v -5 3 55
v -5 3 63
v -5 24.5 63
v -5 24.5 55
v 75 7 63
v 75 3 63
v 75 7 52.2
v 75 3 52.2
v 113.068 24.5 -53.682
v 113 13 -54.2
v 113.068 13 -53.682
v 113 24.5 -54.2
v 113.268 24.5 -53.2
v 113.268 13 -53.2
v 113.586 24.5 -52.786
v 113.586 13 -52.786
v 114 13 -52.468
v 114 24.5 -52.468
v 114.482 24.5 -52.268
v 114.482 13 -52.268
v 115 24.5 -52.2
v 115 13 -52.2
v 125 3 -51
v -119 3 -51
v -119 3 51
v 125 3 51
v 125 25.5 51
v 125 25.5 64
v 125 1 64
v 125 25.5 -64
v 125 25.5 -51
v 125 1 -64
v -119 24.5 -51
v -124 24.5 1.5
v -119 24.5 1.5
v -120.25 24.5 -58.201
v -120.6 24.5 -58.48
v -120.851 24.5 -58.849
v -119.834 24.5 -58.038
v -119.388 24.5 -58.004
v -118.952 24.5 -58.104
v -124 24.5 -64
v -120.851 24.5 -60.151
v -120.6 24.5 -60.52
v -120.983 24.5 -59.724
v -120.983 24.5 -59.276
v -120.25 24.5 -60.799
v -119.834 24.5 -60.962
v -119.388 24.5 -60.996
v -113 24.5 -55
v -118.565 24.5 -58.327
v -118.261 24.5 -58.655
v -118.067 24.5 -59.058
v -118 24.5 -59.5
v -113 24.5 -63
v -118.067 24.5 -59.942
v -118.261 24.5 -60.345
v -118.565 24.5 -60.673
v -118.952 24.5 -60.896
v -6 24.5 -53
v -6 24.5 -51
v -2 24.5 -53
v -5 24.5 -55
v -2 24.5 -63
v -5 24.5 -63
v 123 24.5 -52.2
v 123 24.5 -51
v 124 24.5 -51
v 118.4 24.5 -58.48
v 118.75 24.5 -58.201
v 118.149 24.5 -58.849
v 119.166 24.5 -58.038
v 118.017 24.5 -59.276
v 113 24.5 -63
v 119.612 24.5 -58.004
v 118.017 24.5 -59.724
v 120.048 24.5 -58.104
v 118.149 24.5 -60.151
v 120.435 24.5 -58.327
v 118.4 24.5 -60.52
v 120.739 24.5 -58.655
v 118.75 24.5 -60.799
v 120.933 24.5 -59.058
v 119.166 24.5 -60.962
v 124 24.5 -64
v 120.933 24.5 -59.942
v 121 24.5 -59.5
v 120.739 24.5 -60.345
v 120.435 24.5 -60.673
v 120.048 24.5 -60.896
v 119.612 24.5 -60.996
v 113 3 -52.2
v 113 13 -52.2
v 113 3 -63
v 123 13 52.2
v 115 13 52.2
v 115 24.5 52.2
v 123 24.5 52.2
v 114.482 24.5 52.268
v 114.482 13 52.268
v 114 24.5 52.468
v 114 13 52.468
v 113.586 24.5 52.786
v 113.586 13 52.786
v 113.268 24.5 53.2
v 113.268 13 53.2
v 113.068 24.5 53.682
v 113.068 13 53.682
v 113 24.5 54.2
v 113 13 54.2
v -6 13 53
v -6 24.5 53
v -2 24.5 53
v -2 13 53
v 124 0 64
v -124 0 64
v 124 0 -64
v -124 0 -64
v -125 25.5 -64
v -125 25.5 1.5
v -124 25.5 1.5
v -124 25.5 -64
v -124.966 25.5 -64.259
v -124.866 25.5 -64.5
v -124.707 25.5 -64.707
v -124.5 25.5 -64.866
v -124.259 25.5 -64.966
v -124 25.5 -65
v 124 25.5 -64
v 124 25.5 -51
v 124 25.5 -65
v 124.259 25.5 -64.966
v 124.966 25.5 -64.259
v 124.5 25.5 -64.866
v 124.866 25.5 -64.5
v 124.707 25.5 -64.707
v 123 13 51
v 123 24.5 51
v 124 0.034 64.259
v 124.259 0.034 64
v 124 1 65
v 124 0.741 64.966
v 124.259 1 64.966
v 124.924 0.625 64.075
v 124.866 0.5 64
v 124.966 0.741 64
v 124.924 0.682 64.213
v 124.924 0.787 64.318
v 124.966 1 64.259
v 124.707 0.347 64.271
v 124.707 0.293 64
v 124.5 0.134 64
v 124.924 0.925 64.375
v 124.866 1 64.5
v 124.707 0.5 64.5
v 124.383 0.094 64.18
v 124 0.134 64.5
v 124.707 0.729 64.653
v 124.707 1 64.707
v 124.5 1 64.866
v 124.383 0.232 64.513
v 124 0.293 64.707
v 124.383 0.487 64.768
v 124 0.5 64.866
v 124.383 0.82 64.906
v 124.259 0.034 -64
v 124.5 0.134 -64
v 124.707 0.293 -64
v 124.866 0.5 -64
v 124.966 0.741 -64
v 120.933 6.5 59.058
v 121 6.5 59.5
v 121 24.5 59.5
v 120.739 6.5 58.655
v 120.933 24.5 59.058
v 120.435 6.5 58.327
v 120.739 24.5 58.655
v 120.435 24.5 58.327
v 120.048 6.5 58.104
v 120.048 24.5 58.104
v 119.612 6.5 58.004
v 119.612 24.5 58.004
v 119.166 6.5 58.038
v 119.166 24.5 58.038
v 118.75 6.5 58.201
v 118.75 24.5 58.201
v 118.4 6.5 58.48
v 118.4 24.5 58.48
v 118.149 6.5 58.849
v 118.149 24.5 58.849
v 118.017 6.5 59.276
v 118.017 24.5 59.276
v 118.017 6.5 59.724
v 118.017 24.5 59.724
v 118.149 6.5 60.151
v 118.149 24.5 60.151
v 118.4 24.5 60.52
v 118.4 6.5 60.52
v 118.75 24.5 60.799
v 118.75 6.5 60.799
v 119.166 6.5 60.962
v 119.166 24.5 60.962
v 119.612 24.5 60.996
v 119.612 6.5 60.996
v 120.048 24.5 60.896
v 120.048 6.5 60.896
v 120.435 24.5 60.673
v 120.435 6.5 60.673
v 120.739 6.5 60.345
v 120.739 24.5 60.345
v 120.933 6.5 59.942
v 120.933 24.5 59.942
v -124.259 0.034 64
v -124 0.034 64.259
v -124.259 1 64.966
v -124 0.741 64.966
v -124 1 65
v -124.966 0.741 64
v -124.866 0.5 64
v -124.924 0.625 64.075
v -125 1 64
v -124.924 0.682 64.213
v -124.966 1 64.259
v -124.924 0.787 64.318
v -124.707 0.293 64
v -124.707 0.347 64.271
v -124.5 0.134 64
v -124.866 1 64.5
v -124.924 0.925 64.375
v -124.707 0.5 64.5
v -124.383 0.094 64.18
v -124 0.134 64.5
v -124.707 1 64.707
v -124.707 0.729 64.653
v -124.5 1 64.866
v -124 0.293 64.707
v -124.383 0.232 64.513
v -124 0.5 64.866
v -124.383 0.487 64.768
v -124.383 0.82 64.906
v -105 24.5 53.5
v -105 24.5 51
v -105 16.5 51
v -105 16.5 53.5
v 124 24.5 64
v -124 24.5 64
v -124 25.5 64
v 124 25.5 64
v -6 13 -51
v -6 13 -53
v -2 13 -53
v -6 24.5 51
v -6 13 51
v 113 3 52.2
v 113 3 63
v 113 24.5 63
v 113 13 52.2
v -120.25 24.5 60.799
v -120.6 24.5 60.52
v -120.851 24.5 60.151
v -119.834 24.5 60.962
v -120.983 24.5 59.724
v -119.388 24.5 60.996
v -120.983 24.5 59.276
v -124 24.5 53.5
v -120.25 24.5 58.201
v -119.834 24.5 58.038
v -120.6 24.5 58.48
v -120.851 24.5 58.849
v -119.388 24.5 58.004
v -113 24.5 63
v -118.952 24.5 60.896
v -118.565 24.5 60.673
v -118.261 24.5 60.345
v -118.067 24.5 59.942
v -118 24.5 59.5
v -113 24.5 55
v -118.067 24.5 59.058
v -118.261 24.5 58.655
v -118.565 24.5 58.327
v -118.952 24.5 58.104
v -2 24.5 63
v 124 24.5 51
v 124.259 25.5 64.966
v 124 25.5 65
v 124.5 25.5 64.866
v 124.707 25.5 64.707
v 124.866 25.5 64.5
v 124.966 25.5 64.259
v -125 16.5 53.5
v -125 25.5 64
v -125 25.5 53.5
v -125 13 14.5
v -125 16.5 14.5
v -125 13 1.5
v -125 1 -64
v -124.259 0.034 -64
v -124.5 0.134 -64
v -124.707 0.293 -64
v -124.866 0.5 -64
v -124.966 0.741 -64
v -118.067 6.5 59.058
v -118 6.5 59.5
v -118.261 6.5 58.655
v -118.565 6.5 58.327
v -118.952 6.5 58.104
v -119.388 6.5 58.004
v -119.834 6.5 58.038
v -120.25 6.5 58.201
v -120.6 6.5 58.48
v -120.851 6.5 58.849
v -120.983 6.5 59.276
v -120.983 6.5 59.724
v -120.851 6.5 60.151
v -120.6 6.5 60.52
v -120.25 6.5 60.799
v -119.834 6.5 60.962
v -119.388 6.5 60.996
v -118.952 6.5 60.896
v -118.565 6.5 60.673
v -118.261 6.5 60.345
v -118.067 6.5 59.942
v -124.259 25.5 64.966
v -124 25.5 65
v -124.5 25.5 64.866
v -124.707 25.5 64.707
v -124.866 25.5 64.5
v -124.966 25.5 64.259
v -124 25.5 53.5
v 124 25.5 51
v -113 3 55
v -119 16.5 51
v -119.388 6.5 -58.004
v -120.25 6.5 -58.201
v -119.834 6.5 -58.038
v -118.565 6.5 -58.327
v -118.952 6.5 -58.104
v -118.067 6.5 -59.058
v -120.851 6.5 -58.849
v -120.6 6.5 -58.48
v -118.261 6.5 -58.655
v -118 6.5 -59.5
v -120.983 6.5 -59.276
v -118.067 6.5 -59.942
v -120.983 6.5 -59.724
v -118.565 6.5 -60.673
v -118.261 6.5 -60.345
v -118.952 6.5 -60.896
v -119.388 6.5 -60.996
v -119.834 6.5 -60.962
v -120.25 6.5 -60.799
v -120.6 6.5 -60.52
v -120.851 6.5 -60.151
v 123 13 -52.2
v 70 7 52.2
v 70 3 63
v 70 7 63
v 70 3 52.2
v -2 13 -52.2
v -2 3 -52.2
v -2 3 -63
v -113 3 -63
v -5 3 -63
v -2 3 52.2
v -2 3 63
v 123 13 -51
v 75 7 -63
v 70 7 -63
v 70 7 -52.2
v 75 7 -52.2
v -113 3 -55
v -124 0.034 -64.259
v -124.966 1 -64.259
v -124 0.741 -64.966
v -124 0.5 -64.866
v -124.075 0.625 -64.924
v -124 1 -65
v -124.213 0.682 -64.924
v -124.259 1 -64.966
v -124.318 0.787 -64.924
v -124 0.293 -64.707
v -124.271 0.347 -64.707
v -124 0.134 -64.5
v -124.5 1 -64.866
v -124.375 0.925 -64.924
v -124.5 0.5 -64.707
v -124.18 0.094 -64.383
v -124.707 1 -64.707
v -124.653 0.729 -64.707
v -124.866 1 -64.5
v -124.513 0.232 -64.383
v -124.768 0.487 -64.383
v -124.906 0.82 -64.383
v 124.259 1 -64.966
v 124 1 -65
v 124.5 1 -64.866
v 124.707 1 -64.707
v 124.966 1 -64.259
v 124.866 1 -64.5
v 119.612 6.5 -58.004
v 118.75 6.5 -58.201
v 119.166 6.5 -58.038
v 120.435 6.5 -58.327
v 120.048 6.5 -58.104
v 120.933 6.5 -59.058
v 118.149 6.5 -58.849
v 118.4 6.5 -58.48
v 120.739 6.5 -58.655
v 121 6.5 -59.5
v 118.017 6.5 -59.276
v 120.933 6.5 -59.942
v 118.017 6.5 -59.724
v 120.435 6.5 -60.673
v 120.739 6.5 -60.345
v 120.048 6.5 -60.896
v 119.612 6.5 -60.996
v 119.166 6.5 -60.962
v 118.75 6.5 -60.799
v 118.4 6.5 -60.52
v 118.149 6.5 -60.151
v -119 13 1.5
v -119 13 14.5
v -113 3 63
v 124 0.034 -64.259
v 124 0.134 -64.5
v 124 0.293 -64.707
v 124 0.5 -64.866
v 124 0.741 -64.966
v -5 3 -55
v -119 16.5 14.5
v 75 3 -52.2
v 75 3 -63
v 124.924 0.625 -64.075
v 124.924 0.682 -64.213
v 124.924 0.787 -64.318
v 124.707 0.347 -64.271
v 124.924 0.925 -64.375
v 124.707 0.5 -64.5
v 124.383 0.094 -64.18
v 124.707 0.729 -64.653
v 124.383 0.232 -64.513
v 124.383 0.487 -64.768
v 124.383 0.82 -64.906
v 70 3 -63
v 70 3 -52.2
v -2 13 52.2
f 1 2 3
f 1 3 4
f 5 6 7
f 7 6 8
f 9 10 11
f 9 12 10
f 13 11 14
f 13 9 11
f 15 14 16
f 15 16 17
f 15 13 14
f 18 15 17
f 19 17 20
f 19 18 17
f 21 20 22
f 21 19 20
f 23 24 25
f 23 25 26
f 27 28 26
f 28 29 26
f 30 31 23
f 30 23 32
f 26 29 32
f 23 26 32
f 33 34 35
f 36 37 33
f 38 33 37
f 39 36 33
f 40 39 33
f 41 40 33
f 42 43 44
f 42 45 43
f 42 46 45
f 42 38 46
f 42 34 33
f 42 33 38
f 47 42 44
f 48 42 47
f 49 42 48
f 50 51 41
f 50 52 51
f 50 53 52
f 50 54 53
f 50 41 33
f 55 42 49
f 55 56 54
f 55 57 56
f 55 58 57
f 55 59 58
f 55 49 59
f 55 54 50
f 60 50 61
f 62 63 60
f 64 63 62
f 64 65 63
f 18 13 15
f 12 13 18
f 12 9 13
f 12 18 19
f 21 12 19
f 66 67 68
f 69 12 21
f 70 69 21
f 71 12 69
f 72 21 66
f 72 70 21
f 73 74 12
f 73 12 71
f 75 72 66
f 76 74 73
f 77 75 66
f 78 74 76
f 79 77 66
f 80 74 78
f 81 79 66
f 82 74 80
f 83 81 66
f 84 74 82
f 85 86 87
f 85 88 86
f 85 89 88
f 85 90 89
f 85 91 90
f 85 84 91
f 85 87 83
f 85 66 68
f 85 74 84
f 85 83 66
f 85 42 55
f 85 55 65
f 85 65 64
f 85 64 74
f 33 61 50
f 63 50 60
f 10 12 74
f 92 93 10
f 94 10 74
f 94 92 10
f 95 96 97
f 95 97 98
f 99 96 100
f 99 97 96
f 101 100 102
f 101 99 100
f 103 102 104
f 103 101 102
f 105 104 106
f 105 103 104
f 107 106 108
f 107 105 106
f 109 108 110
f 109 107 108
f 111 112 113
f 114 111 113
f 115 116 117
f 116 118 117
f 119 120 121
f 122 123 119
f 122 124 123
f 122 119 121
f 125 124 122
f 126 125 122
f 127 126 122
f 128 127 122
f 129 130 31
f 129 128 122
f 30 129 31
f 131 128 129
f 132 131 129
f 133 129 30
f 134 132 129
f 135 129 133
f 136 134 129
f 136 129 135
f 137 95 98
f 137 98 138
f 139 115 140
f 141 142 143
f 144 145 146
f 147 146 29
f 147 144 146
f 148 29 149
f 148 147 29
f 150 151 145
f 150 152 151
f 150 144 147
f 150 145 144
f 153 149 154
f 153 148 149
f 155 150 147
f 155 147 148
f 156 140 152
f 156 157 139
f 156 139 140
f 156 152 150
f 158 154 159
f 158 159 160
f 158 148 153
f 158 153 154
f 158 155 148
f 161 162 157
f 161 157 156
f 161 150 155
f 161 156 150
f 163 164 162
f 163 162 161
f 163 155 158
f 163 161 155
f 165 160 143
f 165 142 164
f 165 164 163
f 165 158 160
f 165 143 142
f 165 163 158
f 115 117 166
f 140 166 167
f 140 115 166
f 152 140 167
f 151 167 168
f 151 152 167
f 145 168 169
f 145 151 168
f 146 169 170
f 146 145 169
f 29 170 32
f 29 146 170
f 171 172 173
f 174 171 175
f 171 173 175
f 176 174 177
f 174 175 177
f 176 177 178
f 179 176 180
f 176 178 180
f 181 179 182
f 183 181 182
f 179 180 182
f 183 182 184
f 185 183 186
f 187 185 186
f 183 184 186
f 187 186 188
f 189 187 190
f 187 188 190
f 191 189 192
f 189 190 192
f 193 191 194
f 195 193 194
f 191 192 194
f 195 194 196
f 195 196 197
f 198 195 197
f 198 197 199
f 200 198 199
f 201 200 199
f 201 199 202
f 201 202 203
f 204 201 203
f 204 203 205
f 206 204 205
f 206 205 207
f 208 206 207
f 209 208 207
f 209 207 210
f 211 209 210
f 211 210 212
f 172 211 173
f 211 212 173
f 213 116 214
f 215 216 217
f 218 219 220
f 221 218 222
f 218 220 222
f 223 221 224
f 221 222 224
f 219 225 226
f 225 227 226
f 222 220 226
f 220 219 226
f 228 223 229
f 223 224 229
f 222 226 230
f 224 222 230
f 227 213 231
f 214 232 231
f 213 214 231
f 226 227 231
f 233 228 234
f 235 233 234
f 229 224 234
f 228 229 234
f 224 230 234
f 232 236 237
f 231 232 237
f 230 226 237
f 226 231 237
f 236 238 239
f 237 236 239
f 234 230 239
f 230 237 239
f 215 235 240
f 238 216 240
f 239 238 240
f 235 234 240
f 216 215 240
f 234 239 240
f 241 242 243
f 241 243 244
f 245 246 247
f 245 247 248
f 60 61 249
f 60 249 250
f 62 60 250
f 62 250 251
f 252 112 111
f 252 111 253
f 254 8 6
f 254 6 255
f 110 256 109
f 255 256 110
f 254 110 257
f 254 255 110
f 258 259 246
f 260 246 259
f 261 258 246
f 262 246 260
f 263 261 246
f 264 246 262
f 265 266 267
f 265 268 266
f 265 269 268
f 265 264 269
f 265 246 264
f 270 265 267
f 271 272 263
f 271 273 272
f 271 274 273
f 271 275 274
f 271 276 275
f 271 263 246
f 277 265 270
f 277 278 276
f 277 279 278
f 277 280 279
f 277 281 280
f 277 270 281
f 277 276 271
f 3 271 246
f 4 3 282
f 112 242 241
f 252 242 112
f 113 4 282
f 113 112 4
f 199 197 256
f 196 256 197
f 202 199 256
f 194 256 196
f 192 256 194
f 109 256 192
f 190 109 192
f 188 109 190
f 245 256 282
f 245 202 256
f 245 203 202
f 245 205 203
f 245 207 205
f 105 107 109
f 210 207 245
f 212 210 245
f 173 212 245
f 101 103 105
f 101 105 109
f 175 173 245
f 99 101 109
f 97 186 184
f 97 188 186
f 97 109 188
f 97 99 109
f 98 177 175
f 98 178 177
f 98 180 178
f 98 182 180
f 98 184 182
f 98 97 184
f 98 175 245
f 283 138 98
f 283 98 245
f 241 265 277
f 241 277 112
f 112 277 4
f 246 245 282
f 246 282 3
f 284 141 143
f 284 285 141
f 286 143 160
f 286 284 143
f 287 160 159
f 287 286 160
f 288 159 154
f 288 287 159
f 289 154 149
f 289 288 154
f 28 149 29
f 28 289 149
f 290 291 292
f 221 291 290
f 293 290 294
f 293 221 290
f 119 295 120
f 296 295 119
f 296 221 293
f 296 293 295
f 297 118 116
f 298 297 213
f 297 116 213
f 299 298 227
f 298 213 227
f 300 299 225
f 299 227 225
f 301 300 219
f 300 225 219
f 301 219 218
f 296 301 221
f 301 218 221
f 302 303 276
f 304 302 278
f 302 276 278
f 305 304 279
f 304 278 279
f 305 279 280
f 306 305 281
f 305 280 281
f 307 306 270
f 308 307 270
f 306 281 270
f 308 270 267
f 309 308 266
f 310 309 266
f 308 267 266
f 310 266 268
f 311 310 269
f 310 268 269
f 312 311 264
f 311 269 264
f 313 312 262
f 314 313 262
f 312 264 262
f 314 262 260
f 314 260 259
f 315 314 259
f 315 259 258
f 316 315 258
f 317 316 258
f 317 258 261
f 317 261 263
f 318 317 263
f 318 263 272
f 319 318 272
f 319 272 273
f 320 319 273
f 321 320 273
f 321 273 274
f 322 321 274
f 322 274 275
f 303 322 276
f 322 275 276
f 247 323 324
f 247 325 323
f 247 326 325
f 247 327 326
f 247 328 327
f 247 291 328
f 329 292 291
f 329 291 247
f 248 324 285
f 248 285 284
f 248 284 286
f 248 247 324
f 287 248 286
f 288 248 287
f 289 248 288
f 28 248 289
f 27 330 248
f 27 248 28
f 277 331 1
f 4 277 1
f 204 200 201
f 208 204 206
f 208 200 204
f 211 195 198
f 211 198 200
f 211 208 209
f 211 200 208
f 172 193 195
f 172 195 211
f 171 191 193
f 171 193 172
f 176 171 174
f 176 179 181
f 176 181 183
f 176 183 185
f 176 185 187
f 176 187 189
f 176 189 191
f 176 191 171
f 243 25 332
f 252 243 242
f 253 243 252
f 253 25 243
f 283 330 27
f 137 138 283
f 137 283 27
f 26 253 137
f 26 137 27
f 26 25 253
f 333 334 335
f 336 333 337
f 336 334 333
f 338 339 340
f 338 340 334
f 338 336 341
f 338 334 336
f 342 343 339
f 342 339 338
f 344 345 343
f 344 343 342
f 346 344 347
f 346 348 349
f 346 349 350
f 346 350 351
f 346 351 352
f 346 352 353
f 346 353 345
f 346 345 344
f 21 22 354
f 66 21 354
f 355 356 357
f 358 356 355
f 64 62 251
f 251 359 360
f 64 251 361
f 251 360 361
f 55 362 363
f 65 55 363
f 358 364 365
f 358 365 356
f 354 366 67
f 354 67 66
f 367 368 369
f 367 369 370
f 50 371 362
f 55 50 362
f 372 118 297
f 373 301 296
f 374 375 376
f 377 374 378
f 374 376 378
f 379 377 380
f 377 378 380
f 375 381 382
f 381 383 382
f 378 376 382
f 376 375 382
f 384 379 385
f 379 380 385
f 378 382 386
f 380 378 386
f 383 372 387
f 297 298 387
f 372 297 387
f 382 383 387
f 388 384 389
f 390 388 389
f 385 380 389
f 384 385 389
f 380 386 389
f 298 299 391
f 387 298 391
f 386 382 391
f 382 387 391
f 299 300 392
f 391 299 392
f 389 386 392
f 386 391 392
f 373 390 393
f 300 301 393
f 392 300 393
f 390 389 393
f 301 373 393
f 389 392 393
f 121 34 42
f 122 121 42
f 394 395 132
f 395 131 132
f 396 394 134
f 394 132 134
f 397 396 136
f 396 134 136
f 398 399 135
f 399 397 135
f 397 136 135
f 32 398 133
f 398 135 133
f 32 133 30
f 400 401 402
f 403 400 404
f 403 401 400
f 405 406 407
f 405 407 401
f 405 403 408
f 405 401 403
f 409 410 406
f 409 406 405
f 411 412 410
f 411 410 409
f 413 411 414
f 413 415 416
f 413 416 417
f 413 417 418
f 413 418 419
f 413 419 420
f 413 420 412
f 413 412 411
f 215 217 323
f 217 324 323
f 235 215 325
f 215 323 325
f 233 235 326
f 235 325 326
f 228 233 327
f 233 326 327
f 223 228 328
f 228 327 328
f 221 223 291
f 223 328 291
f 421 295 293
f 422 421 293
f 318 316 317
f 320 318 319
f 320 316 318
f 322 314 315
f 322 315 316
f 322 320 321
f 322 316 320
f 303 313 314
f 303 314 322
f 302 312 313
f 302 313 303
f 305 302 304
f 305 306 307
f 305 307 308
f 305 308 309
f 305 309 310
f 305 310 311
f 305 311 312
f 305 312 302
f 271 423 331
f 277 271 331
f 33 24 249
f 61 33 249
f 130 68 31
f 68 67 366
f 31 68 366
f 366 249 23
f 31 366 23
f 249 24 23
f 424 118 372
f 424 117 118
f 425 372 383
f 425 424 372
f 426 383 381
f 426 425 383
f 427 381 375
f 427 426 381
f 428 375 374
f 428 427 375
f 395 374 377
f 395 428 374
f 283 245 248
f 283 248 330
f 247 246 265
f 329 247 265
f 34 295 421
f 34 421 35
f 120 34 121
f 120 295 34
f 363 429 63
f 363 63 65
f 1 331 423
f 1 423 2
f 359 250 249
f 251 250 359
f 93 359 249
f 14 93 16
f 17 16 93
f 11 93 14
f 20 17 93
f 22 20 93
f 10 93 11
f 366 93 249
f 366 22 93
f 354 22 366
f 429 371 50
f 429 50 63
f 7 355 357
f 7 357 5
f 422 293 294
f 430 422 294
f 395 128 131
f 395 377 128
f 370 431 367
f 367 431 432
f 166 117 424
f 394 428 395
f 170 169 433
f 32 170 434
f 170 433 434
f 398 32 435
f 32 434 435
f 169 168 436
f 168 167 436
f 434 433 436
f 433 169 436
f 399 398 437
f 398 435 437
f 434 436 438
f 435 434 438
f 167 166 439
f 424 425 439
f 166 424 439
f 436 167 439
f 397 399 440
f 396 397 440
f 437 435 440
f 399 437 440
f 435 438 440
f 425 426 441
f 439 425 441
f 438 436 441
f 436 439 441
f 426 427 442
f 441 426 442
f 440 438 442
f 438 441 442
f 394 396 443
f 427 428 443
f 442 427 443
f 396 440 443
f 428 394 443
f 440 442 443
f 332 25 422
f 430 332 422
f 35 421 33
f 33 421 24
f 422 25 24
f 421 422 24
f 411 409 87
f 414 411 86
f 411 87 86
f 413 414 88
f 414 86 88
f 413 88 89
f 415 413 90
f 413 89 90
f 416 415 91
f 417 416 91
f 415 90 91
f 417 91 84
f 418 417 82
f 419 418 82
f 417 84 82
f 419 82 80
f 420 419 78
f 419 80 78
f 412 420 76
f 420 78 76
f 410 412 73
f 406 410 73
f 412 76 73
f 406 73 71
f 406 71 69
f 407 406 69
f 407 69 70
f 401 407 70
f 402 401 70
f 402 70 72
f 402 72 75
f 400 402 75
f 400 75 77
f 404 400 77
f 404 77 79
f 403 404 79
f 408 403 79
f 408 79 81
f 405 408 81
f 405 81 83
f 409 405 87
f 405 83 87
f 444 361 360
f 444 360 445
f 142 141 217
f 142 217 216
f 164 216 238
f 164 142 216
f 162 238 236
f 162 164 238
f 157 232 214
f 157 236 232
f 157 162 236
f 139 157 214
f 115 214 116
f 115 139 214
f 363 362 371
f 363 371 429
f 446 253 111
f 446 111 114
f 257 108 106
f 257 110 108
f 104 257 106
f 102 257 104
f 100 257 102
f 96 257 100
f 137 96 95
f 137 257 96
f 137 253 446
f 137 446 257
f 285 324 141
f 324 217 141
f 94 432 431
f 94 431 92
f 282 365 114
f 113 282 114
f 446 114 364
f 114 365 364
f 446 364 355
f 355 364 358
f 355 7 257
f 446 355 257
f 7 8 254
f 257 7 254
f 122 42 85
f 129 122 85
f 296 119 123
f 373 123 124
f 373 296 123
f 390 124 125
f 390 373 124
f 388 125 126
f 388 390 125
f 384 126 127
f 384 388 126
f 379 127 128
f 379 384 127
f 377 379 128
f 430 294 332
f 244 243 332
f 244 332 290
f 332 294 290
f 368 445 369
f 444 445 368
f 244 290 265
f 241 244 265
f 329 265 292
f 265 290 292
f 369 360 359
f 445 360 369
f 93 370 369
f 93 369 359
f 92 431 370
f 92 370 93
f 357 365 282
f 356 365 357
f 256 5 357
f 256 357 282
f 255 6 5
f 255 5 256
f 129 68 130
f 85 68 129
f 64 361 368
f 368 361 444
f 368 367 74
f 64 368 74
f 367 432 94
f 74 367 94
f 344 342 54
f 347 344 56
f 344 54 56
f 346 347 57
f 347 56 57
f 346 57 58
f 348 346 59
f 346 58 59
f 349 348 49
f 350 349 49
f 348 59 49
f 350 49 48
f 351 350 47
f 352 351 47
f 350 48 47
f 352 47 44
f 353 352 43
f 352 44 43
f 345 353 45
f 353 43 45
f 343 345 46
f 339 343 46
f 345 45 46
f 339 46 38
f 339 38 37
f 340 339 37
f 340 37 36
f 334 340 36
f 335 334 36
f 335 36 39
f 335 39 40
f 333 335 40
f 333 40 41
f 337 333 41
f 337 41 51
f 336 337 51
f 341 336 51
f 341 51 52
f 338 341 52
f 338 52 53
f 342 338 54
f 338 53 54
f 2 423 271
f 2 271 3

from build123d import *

# Parameters (mm, degrees)
SKETCH1_W             = 250
SKETCH1_H             = 130
BOSS_EXTRUDE1_DEPTH   = 3
SKETCH2_W             = 250
SKETCH2_H             = 1
BOSS_EXTRUDE2_DEPTH   = 25.5
SKETCH3_W             = 250
SKETCH3_H             = 1
BOSS_EXTRUDE3_DEPTH   = 22.5
SKETCH4_W             = 1
SKETCH4_H             = 128
BOSS_EXTRUDE4_DEPTH   = 22.5
SKETCH6_W             = 1
SKETCH6_H             = 14
BOSS_EXTRUDE5_DEPTH   = 22.5
SKETCH7_W             = 1
SKETCH7_H             = 14
BOSS_EXTRUDE6_DEPTH   = 22.5
SKETCH8_W             = 1
SKETCH8_H             = 13
BOSS_EXTRUDE7_DEPTH   = 21.5
SKETCH10_W            = 247
SKETCH10_H            = 1
BOSS_EXTRUDE8_DEPTH   = 21.5
SKETCH11_W            = 1
SKETCH11_H            = 127
BOSS_EXTRUDE9_DEPTH   = 21.5
SKETCH14_W            = 247
SKETCH14_H            = 1
BOSS_EXTRUDE10_DEPTH  = 21.5
SKETCH15_W            = 1
SKETCH15_H            = 12
BOSS_EXTRUDE11_DEPTH  = 21.5
FILLET1_R             = 1
SKETCH17_W            = 128
SKETCH17_H            = 1.2
BOSS_EXTRUDE12_DEPTH  = 10
SKETCH19_W            = 128
SKETCH19_H            = 1.2
BOSS_EXTRUDE13_DEPTH  = 10
SKETCH22_W            = 3
SKETCH22_H            = 10.8
BOSS_EXTRUDE14_DEPTH  = 21.5
SKETCH24_W            = 3
SKETCH24_H            = 10.8
BOSS_EXTRUDE15_DEPTH  = 21.5
SKETCH31_W            = 5
SKETCH31_H            = 10.8
BOSS_EXTRUDE16_DEPTH  = 4
SKETCH33_W            = 5
SKETCH33_H            = 10.8
BOSS_EXTRUDE18_DEPTH  = 4
SKETCH44_W            = 118
SKETCH44_H            = 4
BOSS_EXTRUDE28_DEPTH  = 21.5
SKETCH45_W            = 10
SKETCH45_H            = 12
BOSS_EXTRUDE29_DEPTH  = 21.5
SKETCH46_W            = 10
SKETCH46_H            = 8
BOSS_EXTRUDE30_DEPTH  = 21.5
SKETCH47_W            = 10
SKETCH47_H            = 10.8
BOSS_EXTRUDE31_DEPTH  = 21.5
SKETCH48_W            = 10
SKETCH48_H            = 10.8
BOSS_EXTRUDE32_DEPTH  = 21.5
SKETCH49_W            = 108
SKETCH49_H            = 4
BOSS_EXTRUDE33_DEPTH  = 21.5
SKETCH62_R            = 1.5
CASEMUNTHOLE001_DEPTH = 18
SKETCH63_R            = 1.5
CASEMUNTHOLE002_DEPTH = 18
SKETCH64_R            = 1.5
CASEMUNTHOLE003_DEPTH = 18
SKETCH65_R            = 1.5
CASEMUNTHOLE004_DEPTH = 18
SKETCH67_W            = 4
SKETCH67_H            = 102
BOSS_EXTRUDE35_DEPTH  = 21.5
SKETCH72_W            = 39
SKETCH72_H            = 9
CUT_EXTRUDE1_DEPTH    = 20
SKETCH73_W            = 13
SKETCH73_H            = 12.5
CUT_EXTRUDE2_DEPTH    = 20
SKETCH74_W            = 4
SKETCH74_H            = 2
CUT_EXTRUDE3_DEPTH    = 11.5
SKETCH75_W            = 4
SKETCH75_H            = 2
CUT_EXTRUDE4_DEPTH    = 11.5
FILLET2_R             = 2


with BuildPart() as part:
    # Sketch1 → Boss-Extrude1 (new body)
    with BuildSketch(Plane(origin=(0, 0, 0), x_dir=(1, 0, 0), z_dir=(0, 1, 0))):
        Rectangle(SKETCH1_W, SKETCH1_H)
    extrude(amount=BOSS_EXTRUDE1_DEPTH)

    # Sketch2 → Boss-Extrude2 (add)
    with BuildSketch(Plane(origin=(0, 0, 0), x_dir=(1, 0, 0), z_dir=(0, 1, 0))):
        with Locations((0, 64.5)):
            Rectangle(SKETCH2_W, SKETCH2_H)
    extrude(amount=BOSS_EXTRUDE2_DEPTH)

    # Sketch3 → Boss-Extrude3 (add)
    with BuildSketch(Plane(origin=(0, 3, 0), x_dir=(1, 0, 0), z_dir=(0, 1, 0))):
        with Locations((0, -64.5)):
            Rectangle(SKETCH3_W, SKETCH3_H)
    extrude(amount=BOSS_EXTRUDE3_DEPTH)

    # Sketch4 → Boss-Extrude4 (add)
    with BuildSketch(Plane(origin=(0, 3, 0), x_dir=(1, 0, 0), z_dir=(0, 1, 0))):
        with Locations((-124.5, 0)):
            Rectangle(SKETCH4_W, SKETCH4_H)
    extrude(amount=BOSS_EXTRUDE4_DEPTH)

    # Sketch6 → Boss-Extrude5 (add)
    with BuildSketch(Plane(origin=(0, 3, 0), x_dir=(1, 0, 0), z_dir=(0, 1, 0))):
        with Locations((124.5, -58)):
            Rectangle(SKETCH6_W, SKETCH6_H)
    extrude(amount=BOSS_EXTRUDE5_DEPTH)

    # Sketch7 → Boss-Extrude6 (add)
    with BuildSketch(Plane(origin=(0, 3, 0), x_dir=(1, 0, 0), z_dir=(0, 1, 0))):
        with Locations((124.5, 58)):
            Rectangle(SKETCH7_W, SKETCH7_H)
    extrude(amount=BOSS_EXTRUDE6_DEPTH)

    # Sketch8 → Boss-Extrude7 (add)
    with BuildSketch(Plane(origin=(0, 3, 0), x_dir=(1, 0, 0), z_dir=(0, 1, 0))):
        with Locations((123.5, 57.5)):
            Rectangle(SKETCH8_W, SKETCH8_H)
    extrude(amount=BOSS_EXTRUDE7_DEPTH)

    # Sketch10 → Boss-Extrude8 (add)
    with BuildSketch(Plane(origin=(0, 3, 0), x_dir=(1, 0, 0), z_dir=(0, 1, 0))):
        with Locations((-0.5, 63.5)):
            Rectangle(SKETCH10_W, SKETCH10_H)
    extrude(amount=BOSS_EXTRUDE8_DEPTH)

    # Sketch11 → Boss-Extrude9 (add)
    with BuildSketch(Plane(origin=(0, 3, 0), x_dir=(1, 0, 0), z_dir=(0, 1, 0))):
        with Locations((-123.5, -0.5)):
            Rectangle(SKETCH11_W, SKETCH11_H)
    extrude(amount=BOSS_EXTRUDE9_DEPTH)

    # Sketch14 → Boss-Extrude10 (add)
    with BuildSketch(Plane(origin=(0, 3, 0), x_dir=(1, 0, 0), z_dir=(0, 1, 0))):
        with Locations((0.5, -63.5)):
            Rectangle(SKETCH14_W, SKETCH14_H)
    extrude(amount=BOSS_EXTRUDE10_DEPTH)

    # Sketch15 → Boss-Extrude11 (add)
    with BuildSketch(Plane(origin=(0, 3, 0), x_dir=(1, 0, 0), z_dir=(0, 1, 0))):
        with Locations((123.5, -57)):
            Rectangle(SKETCH15_W, SKETCH15_H)
    extrude(amount=BOSS_EXTRUDE11_DEPTH)

    # Fillet1
    fillet1_edges = [part.edges().sort_by_distance(p)[0] for p in [
        (0, 0, 65),
        (-125, 0, 0),
        (0, 0, -65),
        (125, 0, 0),
        (125, 12.75, 65),
        (-125, 12.75, 65),
        (-125, 12.75, -65),
        (125, 12.75, -65),
    ]]
    fillet(fillet1_edges, radius=FILLET1_R)

    # Sketch17 → Boss-Extrude12 (add)
    with BuildSketch(Plane(origin=(0, 3, 0), x_dir=(1, 0, 0), z_dir=(0, 1, 0))):
        with Locations((59, 51.6)):
            Rectangle(SKETCH17_W, SKETCH17_H)
    extrude(amount=BOSS_EXTRUDE12_DEPTH)

    # Sketch19 → Boss-Extrude13 (add)
    with BuildSketch(Plane(origin=(0, 3, 0), x_dir=(1, 0, 0), z_dir=(0, 1, 0))):
        with Locations((59, -51.6)):
            Rectangle(SKETCH19_W, SKETCH19_H)
    extrude(amount=BOSS_EXTRUDE13_DEPTH)

    # Sketch22 → Boss-Extrude14 (add)
    with BuildSketch(Plane(origin=(0, 3, 0), x_dir=(1, 0, 0), z_dir=(0, 1, 0))):
        with Locations((-3.5, -57.6)):
            Rectangle(SKETCH22_W, SKETCH22_H)
    extrude(amount=BOSS_EXTRUDE14_DEPTH)

    # Sketch24 → Boss-Extrude15 (add)
    with BuildSketch(Plane(origin=(0, 3, 0), x_dir=(1, 0, 0), z_dir=(0, 1, 0))):
        with Locations((-3.5, 57.6)):
            Rectangle(SKETCH24_W, SKETCH24_H)
    extrude(amount=BOSS_EXTRUDE15_DEPTH)

    # Sketch31 → Boss-Extrude16 (add)
    with BuildSketch(Plane(origin=(0, 3, 0), x_dir=(1, 0, 0), z_dir=(0, 1, 0))):
        with Locations((72.5, -57.6)):
            Rectangle(SKETCH31_W, SKETCH31_H)
    extrude(amount=BOSS_EXTRUDE16_DEPTH)

    # Sketch33 → Boss-Extrude18 (add)
    with BuildSketch(Plane(origin=(0, 3, 0), x_dir=(1, 0, 0), z_dir=(0, 1, 0))):
        with Locations((72.5, 57.6)):
            Rectangle(SKETCH33_W, SKETCH33_H)
    extrude(amount=BOSS_EXTRUDE18_DEPTH)

    # Sketch44 → Boss-Extrude28 (add)
    with BuildSketch(Plane(origin=(0, 3, 0), x_dir=(1, 0, 0), z_dir=(0, 1, 0))):
        with Locations((-64, -53)):
            Rectangle(SKETCH44_W, SKETCH44_H)
    extrude(amount=BOSS_EXTRUDE28_DEPTH)

    # Sketch45 → Boss-Extrude29 (add)
    with BuildSketch(Plane(origin=(0, 3, 0), x_dir=(1, 0, 0), z_dir=(0, 1, 0))):
        with Locations((-118, 57)):
            Rectangle(SKETCH45_W, SKETCH45_H)
    extrude(amount=BOSS_EXTRUDE29_DEPTH)

    # Sketch46 → Boss-Extrude30 (add)
    with BuildSketch(Plane(origin=(0, 3, 0), x_dir=(1, 0, 0), z_dir=(0, 1, 0))):
        with Locations((-118, -59)):
            Rectangle(SKETCH46_W, SKETCH46_H)
    extrude(amount=BOSS_EXTRUDE30_DEPTH)

    # Sketch47 → Boss-Extrude31 (add)
    with BuildSketch(Plane(origin=(0, 3, 0), x_dir=(1, 0, 0), z_dir=(0, 1, 0))):
        with Locations((118, 57.6)):
            Rectangle(SKETCH47_W, SKETCH47_H)
    extrude(amount=BOSS_EXTRUDE31_DEPTH)

    # Sketch48 → Boss-Extrude32 (add)
    with BuildSketch(Plane(origin=(0, 3, 0), x_dir=(1, 0, 0), z_dir=(0, 1, 0))):
        with Locations((118, -57.6)):
            Rectangle(SKETCH48_W, SKETCH48_H)
    extrude(amount=BOSS_EXTRUDE32_DEPTH)

    # Sketch49 → Boss-Extrude33 (add)
    with BuildSketch(Plane(origin=(0, 3, 0), x_dir=(1, 0, 0), z_dir=(0, 1, 0))):
        with Locations((-59, 53)):
            Rectangle(SKETCH49_W, SKETCH49_H)
    extrude(amount=BOSS_EXTRUDE33_DEPTH)

    # Sketch62 → CaseMuntHole001 (cut)
    with BuildSketch(Plane(origin=(0, 24.5, 0), x_dir=(1, 0, 0), z_dir=(0, 1, 0))):
        with Locations((-119.5, 59.5)):
            Circle(SKETCH62_R)
    extrude(amount=-CASEMUNTHOLE001_DEPTH, mode=Mode.SUBTRACT)

    # Sketch63 → CaseMuntHole002 (cut)
    with BuildSketch(Plane(origin=(0, 24.5, 0), x_dir=(1, 0, 0), z_dir=(0, 1, 0))):
        with Locations((119.5, 59.5)):
            Circle(SKETCH63_R)
    extrude(amount=-CASEMUNTHOLE002_DEPTH, mode=Mode.SUBTRACT)

    # Sketch64 → CaseMuntHole003 (cut)
    with BuildSketch(Plane(origin=(0, 24.5, 0), x_dir=(1, 0, 0), z_dir=(0, 1, 0))):
        with Locations((119.5, -59.5)):
            Circle(SKETCH64_R)
    extrude(amount=-CASEMUNTHOLE003_DEPTH, mode=Mode.SUBTRACT)

    # Sketch65 → CaseMuntHole004 (cut)
    with BuildSketch(Plane(origin=(0, 24.5, 0), x_dir=(1, 0, 0), z_dir=(0, 1, 0))):
        with Locations((-119.5, -59.5)):
            Circle(SKETCH65_R)
    extrude(amount=-CASEMUNTHOLE004_DEPTH, mode=Mode.SUBTRACT)

    # Sketch67 → Boss-Extrude35 (add)
    with BuildSketch(Plane(origin=(0, 3, 0), x_dir=(1, 0, 0), z_dir=(0, 1, 0))):
        with Locations((-121, 0)):
            Rectangle(SKETCH67_W, SKETCH67_H)
    extrude(amount=BOSS_EXTRUDE35_DEPTH)

    # Sketch72 → Cut-Extrude1 (cut)
    with BuildSketch(Plane.ZY.offset(125)):
        with Locations((34, 21)):
            Rectangle(SKETCH72_W, SKETCH72_H)
    extrude(amount=-CUT_EXTRUDE1_DEPTH, mode=Mode.SUBTRACT)

    # Sketch73 → Cut-Extrude2 (cut)
    with BuildSketch(Plane.ZY.offset(125)):
        with Locations((8, 19.25)):
            Rectangle(SKETCH73_W, SKETCH73_H)
    extrude(amount=-CUT_EXTRUDE2_DEPTH, mode=Mode.SUBTRACT)

    # Sketch74 → Cut-Extrude3 (cut)
    with BuildSketch(Plane(origin=(0, 24.5, 0), x_dir=(1, 0, 0), z_dir=(0, 1, 0))):
        with Locations((-4, -52)):
            Rectangle(SKETCH74_W, SKETCH74_H)
    extrude(amount=-CUT_EXTRUDE3_DEPTH, mode=Mode.SUBTRACT)

    # Sketch75 → Cut-Extrude4 (cut)
    with BuildSketch(Plane(origin=(0, 24.5, 0), x_dir=(1, 0, 0), z_dir=(0, 1, 0))):
        with Locations((-4, 52)):
            Rectangle(SKETCH75_W, SKETCH75_H)
    extrude(amount=-CUT_EXTRUDE4_DEPTH, mode=Mode.SUBTRACT)

    # Fillet2
    fillet2_edges = [part.edges().sort_by_distance(p)[0] for p in [
        (113, 18.75, -52.2),
        (113, 18.75, 52.2),
    ]]
    fillet(fillet2_edges, radius=FILLET2_R)


solid = part.part
